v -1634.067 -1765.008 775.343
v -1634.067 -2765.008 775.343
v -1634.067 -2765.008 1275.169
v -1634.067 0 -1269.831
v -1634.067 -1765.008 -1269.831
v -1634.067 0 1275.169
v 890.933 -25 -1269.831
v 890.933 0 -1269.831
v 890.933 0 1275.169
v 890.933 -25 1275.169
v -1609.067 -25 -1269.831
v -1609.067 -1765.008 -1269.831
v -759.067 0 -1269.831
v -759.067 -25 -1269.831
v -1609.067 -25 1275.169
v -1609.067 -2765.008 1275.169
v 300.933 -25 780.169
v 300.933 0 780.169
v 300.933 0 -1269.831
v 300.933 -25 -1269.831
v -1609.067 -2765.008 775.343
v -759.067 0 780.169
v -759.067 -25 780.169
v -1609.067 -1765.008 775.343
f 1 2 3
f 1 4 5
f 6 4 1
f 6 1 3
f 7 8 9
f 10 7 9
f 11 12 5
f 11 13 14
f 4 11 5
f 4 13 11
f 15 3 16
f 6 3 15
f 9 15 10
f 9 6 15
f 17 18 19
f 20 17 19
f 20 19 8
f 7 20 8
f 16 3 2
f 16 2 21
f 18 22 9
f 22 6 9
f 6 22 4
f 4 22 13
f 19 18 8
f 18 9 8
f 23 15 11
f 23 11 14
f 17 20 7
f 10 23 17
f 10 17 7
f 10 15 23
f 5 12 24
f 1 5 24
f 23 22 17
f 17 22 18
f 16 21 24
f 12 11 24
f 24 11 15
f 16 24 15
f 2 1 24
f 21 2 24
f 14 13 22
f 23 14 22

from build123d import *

# Parameters (mm, degrees)
F1_DEPTH = 25
F2_W     = 1018.0079698563
F2_H     = 2545
F3_DEPTH = 25
F4_DEPTH = 25
F5_DEPTH = 722
F6_W     = 25
F6_H     = 499.8260952983
F7_DEPTH = 1000


with BuildPart() as f1:
    # F0 (on Front) → F1 (new body)
    with BuildSketch(Plane.XZ):
        Polygon((890.9331802642, 1275.1689769779), (-1609.0668197358, 1275.1689769779), (-1609.0668197358, -1269.8310230221), (-759.0668197358, -1269.8310230221), (-759.0668197358, 780.1689769779), (300.9331802642, 780.1689769779), (300.9331802642, -1269.8310230221), (890.9331802642, -1269.8310230221), align=None)
    extrude(amount=F1_DEPTH)

    # F2 (on face) → F3 (join)
    with BuildSketch(Plane(origin=(-1609.0668197358, 0, 0), x_dir=(0, -1, 0), z_dir=(-1, 0, 0))):
        with Locations((534.0039849281, 2.6689769779)):
            Rectangle(F2_W, F2_H)
    extrude(amount=F3_DEPTH)

    # F4 (add): a face of the model
    f4_faces = [f1.faces().sort_by_distance(p)[0] for p in [
        (-1609.0668197358, -12.5, 2.6689769779),
    ]]
    extrude(f4_faces, amount=F4_DEPTH)

    # F5 (add): a face of the model
    f5_faces = [f1.faces().sort_by_distance(p)[0] for p in [
        (-1621.5668197358, -1043.0079698563, 2.6689769779),
    ]]
    extrude(f5_faces, amount=F5_DEPTH)

    # F6 (on face) → F7 (join)
    with BuildSketch(Plane.XZ.offset(1765.0079698563)):
        with Locations((-1621.5668197358, 1025.2559293287)):
            Rectangle(F6_W, F6_H)
    extrude(amount=F7_DEPTH)


solid = f1.part
